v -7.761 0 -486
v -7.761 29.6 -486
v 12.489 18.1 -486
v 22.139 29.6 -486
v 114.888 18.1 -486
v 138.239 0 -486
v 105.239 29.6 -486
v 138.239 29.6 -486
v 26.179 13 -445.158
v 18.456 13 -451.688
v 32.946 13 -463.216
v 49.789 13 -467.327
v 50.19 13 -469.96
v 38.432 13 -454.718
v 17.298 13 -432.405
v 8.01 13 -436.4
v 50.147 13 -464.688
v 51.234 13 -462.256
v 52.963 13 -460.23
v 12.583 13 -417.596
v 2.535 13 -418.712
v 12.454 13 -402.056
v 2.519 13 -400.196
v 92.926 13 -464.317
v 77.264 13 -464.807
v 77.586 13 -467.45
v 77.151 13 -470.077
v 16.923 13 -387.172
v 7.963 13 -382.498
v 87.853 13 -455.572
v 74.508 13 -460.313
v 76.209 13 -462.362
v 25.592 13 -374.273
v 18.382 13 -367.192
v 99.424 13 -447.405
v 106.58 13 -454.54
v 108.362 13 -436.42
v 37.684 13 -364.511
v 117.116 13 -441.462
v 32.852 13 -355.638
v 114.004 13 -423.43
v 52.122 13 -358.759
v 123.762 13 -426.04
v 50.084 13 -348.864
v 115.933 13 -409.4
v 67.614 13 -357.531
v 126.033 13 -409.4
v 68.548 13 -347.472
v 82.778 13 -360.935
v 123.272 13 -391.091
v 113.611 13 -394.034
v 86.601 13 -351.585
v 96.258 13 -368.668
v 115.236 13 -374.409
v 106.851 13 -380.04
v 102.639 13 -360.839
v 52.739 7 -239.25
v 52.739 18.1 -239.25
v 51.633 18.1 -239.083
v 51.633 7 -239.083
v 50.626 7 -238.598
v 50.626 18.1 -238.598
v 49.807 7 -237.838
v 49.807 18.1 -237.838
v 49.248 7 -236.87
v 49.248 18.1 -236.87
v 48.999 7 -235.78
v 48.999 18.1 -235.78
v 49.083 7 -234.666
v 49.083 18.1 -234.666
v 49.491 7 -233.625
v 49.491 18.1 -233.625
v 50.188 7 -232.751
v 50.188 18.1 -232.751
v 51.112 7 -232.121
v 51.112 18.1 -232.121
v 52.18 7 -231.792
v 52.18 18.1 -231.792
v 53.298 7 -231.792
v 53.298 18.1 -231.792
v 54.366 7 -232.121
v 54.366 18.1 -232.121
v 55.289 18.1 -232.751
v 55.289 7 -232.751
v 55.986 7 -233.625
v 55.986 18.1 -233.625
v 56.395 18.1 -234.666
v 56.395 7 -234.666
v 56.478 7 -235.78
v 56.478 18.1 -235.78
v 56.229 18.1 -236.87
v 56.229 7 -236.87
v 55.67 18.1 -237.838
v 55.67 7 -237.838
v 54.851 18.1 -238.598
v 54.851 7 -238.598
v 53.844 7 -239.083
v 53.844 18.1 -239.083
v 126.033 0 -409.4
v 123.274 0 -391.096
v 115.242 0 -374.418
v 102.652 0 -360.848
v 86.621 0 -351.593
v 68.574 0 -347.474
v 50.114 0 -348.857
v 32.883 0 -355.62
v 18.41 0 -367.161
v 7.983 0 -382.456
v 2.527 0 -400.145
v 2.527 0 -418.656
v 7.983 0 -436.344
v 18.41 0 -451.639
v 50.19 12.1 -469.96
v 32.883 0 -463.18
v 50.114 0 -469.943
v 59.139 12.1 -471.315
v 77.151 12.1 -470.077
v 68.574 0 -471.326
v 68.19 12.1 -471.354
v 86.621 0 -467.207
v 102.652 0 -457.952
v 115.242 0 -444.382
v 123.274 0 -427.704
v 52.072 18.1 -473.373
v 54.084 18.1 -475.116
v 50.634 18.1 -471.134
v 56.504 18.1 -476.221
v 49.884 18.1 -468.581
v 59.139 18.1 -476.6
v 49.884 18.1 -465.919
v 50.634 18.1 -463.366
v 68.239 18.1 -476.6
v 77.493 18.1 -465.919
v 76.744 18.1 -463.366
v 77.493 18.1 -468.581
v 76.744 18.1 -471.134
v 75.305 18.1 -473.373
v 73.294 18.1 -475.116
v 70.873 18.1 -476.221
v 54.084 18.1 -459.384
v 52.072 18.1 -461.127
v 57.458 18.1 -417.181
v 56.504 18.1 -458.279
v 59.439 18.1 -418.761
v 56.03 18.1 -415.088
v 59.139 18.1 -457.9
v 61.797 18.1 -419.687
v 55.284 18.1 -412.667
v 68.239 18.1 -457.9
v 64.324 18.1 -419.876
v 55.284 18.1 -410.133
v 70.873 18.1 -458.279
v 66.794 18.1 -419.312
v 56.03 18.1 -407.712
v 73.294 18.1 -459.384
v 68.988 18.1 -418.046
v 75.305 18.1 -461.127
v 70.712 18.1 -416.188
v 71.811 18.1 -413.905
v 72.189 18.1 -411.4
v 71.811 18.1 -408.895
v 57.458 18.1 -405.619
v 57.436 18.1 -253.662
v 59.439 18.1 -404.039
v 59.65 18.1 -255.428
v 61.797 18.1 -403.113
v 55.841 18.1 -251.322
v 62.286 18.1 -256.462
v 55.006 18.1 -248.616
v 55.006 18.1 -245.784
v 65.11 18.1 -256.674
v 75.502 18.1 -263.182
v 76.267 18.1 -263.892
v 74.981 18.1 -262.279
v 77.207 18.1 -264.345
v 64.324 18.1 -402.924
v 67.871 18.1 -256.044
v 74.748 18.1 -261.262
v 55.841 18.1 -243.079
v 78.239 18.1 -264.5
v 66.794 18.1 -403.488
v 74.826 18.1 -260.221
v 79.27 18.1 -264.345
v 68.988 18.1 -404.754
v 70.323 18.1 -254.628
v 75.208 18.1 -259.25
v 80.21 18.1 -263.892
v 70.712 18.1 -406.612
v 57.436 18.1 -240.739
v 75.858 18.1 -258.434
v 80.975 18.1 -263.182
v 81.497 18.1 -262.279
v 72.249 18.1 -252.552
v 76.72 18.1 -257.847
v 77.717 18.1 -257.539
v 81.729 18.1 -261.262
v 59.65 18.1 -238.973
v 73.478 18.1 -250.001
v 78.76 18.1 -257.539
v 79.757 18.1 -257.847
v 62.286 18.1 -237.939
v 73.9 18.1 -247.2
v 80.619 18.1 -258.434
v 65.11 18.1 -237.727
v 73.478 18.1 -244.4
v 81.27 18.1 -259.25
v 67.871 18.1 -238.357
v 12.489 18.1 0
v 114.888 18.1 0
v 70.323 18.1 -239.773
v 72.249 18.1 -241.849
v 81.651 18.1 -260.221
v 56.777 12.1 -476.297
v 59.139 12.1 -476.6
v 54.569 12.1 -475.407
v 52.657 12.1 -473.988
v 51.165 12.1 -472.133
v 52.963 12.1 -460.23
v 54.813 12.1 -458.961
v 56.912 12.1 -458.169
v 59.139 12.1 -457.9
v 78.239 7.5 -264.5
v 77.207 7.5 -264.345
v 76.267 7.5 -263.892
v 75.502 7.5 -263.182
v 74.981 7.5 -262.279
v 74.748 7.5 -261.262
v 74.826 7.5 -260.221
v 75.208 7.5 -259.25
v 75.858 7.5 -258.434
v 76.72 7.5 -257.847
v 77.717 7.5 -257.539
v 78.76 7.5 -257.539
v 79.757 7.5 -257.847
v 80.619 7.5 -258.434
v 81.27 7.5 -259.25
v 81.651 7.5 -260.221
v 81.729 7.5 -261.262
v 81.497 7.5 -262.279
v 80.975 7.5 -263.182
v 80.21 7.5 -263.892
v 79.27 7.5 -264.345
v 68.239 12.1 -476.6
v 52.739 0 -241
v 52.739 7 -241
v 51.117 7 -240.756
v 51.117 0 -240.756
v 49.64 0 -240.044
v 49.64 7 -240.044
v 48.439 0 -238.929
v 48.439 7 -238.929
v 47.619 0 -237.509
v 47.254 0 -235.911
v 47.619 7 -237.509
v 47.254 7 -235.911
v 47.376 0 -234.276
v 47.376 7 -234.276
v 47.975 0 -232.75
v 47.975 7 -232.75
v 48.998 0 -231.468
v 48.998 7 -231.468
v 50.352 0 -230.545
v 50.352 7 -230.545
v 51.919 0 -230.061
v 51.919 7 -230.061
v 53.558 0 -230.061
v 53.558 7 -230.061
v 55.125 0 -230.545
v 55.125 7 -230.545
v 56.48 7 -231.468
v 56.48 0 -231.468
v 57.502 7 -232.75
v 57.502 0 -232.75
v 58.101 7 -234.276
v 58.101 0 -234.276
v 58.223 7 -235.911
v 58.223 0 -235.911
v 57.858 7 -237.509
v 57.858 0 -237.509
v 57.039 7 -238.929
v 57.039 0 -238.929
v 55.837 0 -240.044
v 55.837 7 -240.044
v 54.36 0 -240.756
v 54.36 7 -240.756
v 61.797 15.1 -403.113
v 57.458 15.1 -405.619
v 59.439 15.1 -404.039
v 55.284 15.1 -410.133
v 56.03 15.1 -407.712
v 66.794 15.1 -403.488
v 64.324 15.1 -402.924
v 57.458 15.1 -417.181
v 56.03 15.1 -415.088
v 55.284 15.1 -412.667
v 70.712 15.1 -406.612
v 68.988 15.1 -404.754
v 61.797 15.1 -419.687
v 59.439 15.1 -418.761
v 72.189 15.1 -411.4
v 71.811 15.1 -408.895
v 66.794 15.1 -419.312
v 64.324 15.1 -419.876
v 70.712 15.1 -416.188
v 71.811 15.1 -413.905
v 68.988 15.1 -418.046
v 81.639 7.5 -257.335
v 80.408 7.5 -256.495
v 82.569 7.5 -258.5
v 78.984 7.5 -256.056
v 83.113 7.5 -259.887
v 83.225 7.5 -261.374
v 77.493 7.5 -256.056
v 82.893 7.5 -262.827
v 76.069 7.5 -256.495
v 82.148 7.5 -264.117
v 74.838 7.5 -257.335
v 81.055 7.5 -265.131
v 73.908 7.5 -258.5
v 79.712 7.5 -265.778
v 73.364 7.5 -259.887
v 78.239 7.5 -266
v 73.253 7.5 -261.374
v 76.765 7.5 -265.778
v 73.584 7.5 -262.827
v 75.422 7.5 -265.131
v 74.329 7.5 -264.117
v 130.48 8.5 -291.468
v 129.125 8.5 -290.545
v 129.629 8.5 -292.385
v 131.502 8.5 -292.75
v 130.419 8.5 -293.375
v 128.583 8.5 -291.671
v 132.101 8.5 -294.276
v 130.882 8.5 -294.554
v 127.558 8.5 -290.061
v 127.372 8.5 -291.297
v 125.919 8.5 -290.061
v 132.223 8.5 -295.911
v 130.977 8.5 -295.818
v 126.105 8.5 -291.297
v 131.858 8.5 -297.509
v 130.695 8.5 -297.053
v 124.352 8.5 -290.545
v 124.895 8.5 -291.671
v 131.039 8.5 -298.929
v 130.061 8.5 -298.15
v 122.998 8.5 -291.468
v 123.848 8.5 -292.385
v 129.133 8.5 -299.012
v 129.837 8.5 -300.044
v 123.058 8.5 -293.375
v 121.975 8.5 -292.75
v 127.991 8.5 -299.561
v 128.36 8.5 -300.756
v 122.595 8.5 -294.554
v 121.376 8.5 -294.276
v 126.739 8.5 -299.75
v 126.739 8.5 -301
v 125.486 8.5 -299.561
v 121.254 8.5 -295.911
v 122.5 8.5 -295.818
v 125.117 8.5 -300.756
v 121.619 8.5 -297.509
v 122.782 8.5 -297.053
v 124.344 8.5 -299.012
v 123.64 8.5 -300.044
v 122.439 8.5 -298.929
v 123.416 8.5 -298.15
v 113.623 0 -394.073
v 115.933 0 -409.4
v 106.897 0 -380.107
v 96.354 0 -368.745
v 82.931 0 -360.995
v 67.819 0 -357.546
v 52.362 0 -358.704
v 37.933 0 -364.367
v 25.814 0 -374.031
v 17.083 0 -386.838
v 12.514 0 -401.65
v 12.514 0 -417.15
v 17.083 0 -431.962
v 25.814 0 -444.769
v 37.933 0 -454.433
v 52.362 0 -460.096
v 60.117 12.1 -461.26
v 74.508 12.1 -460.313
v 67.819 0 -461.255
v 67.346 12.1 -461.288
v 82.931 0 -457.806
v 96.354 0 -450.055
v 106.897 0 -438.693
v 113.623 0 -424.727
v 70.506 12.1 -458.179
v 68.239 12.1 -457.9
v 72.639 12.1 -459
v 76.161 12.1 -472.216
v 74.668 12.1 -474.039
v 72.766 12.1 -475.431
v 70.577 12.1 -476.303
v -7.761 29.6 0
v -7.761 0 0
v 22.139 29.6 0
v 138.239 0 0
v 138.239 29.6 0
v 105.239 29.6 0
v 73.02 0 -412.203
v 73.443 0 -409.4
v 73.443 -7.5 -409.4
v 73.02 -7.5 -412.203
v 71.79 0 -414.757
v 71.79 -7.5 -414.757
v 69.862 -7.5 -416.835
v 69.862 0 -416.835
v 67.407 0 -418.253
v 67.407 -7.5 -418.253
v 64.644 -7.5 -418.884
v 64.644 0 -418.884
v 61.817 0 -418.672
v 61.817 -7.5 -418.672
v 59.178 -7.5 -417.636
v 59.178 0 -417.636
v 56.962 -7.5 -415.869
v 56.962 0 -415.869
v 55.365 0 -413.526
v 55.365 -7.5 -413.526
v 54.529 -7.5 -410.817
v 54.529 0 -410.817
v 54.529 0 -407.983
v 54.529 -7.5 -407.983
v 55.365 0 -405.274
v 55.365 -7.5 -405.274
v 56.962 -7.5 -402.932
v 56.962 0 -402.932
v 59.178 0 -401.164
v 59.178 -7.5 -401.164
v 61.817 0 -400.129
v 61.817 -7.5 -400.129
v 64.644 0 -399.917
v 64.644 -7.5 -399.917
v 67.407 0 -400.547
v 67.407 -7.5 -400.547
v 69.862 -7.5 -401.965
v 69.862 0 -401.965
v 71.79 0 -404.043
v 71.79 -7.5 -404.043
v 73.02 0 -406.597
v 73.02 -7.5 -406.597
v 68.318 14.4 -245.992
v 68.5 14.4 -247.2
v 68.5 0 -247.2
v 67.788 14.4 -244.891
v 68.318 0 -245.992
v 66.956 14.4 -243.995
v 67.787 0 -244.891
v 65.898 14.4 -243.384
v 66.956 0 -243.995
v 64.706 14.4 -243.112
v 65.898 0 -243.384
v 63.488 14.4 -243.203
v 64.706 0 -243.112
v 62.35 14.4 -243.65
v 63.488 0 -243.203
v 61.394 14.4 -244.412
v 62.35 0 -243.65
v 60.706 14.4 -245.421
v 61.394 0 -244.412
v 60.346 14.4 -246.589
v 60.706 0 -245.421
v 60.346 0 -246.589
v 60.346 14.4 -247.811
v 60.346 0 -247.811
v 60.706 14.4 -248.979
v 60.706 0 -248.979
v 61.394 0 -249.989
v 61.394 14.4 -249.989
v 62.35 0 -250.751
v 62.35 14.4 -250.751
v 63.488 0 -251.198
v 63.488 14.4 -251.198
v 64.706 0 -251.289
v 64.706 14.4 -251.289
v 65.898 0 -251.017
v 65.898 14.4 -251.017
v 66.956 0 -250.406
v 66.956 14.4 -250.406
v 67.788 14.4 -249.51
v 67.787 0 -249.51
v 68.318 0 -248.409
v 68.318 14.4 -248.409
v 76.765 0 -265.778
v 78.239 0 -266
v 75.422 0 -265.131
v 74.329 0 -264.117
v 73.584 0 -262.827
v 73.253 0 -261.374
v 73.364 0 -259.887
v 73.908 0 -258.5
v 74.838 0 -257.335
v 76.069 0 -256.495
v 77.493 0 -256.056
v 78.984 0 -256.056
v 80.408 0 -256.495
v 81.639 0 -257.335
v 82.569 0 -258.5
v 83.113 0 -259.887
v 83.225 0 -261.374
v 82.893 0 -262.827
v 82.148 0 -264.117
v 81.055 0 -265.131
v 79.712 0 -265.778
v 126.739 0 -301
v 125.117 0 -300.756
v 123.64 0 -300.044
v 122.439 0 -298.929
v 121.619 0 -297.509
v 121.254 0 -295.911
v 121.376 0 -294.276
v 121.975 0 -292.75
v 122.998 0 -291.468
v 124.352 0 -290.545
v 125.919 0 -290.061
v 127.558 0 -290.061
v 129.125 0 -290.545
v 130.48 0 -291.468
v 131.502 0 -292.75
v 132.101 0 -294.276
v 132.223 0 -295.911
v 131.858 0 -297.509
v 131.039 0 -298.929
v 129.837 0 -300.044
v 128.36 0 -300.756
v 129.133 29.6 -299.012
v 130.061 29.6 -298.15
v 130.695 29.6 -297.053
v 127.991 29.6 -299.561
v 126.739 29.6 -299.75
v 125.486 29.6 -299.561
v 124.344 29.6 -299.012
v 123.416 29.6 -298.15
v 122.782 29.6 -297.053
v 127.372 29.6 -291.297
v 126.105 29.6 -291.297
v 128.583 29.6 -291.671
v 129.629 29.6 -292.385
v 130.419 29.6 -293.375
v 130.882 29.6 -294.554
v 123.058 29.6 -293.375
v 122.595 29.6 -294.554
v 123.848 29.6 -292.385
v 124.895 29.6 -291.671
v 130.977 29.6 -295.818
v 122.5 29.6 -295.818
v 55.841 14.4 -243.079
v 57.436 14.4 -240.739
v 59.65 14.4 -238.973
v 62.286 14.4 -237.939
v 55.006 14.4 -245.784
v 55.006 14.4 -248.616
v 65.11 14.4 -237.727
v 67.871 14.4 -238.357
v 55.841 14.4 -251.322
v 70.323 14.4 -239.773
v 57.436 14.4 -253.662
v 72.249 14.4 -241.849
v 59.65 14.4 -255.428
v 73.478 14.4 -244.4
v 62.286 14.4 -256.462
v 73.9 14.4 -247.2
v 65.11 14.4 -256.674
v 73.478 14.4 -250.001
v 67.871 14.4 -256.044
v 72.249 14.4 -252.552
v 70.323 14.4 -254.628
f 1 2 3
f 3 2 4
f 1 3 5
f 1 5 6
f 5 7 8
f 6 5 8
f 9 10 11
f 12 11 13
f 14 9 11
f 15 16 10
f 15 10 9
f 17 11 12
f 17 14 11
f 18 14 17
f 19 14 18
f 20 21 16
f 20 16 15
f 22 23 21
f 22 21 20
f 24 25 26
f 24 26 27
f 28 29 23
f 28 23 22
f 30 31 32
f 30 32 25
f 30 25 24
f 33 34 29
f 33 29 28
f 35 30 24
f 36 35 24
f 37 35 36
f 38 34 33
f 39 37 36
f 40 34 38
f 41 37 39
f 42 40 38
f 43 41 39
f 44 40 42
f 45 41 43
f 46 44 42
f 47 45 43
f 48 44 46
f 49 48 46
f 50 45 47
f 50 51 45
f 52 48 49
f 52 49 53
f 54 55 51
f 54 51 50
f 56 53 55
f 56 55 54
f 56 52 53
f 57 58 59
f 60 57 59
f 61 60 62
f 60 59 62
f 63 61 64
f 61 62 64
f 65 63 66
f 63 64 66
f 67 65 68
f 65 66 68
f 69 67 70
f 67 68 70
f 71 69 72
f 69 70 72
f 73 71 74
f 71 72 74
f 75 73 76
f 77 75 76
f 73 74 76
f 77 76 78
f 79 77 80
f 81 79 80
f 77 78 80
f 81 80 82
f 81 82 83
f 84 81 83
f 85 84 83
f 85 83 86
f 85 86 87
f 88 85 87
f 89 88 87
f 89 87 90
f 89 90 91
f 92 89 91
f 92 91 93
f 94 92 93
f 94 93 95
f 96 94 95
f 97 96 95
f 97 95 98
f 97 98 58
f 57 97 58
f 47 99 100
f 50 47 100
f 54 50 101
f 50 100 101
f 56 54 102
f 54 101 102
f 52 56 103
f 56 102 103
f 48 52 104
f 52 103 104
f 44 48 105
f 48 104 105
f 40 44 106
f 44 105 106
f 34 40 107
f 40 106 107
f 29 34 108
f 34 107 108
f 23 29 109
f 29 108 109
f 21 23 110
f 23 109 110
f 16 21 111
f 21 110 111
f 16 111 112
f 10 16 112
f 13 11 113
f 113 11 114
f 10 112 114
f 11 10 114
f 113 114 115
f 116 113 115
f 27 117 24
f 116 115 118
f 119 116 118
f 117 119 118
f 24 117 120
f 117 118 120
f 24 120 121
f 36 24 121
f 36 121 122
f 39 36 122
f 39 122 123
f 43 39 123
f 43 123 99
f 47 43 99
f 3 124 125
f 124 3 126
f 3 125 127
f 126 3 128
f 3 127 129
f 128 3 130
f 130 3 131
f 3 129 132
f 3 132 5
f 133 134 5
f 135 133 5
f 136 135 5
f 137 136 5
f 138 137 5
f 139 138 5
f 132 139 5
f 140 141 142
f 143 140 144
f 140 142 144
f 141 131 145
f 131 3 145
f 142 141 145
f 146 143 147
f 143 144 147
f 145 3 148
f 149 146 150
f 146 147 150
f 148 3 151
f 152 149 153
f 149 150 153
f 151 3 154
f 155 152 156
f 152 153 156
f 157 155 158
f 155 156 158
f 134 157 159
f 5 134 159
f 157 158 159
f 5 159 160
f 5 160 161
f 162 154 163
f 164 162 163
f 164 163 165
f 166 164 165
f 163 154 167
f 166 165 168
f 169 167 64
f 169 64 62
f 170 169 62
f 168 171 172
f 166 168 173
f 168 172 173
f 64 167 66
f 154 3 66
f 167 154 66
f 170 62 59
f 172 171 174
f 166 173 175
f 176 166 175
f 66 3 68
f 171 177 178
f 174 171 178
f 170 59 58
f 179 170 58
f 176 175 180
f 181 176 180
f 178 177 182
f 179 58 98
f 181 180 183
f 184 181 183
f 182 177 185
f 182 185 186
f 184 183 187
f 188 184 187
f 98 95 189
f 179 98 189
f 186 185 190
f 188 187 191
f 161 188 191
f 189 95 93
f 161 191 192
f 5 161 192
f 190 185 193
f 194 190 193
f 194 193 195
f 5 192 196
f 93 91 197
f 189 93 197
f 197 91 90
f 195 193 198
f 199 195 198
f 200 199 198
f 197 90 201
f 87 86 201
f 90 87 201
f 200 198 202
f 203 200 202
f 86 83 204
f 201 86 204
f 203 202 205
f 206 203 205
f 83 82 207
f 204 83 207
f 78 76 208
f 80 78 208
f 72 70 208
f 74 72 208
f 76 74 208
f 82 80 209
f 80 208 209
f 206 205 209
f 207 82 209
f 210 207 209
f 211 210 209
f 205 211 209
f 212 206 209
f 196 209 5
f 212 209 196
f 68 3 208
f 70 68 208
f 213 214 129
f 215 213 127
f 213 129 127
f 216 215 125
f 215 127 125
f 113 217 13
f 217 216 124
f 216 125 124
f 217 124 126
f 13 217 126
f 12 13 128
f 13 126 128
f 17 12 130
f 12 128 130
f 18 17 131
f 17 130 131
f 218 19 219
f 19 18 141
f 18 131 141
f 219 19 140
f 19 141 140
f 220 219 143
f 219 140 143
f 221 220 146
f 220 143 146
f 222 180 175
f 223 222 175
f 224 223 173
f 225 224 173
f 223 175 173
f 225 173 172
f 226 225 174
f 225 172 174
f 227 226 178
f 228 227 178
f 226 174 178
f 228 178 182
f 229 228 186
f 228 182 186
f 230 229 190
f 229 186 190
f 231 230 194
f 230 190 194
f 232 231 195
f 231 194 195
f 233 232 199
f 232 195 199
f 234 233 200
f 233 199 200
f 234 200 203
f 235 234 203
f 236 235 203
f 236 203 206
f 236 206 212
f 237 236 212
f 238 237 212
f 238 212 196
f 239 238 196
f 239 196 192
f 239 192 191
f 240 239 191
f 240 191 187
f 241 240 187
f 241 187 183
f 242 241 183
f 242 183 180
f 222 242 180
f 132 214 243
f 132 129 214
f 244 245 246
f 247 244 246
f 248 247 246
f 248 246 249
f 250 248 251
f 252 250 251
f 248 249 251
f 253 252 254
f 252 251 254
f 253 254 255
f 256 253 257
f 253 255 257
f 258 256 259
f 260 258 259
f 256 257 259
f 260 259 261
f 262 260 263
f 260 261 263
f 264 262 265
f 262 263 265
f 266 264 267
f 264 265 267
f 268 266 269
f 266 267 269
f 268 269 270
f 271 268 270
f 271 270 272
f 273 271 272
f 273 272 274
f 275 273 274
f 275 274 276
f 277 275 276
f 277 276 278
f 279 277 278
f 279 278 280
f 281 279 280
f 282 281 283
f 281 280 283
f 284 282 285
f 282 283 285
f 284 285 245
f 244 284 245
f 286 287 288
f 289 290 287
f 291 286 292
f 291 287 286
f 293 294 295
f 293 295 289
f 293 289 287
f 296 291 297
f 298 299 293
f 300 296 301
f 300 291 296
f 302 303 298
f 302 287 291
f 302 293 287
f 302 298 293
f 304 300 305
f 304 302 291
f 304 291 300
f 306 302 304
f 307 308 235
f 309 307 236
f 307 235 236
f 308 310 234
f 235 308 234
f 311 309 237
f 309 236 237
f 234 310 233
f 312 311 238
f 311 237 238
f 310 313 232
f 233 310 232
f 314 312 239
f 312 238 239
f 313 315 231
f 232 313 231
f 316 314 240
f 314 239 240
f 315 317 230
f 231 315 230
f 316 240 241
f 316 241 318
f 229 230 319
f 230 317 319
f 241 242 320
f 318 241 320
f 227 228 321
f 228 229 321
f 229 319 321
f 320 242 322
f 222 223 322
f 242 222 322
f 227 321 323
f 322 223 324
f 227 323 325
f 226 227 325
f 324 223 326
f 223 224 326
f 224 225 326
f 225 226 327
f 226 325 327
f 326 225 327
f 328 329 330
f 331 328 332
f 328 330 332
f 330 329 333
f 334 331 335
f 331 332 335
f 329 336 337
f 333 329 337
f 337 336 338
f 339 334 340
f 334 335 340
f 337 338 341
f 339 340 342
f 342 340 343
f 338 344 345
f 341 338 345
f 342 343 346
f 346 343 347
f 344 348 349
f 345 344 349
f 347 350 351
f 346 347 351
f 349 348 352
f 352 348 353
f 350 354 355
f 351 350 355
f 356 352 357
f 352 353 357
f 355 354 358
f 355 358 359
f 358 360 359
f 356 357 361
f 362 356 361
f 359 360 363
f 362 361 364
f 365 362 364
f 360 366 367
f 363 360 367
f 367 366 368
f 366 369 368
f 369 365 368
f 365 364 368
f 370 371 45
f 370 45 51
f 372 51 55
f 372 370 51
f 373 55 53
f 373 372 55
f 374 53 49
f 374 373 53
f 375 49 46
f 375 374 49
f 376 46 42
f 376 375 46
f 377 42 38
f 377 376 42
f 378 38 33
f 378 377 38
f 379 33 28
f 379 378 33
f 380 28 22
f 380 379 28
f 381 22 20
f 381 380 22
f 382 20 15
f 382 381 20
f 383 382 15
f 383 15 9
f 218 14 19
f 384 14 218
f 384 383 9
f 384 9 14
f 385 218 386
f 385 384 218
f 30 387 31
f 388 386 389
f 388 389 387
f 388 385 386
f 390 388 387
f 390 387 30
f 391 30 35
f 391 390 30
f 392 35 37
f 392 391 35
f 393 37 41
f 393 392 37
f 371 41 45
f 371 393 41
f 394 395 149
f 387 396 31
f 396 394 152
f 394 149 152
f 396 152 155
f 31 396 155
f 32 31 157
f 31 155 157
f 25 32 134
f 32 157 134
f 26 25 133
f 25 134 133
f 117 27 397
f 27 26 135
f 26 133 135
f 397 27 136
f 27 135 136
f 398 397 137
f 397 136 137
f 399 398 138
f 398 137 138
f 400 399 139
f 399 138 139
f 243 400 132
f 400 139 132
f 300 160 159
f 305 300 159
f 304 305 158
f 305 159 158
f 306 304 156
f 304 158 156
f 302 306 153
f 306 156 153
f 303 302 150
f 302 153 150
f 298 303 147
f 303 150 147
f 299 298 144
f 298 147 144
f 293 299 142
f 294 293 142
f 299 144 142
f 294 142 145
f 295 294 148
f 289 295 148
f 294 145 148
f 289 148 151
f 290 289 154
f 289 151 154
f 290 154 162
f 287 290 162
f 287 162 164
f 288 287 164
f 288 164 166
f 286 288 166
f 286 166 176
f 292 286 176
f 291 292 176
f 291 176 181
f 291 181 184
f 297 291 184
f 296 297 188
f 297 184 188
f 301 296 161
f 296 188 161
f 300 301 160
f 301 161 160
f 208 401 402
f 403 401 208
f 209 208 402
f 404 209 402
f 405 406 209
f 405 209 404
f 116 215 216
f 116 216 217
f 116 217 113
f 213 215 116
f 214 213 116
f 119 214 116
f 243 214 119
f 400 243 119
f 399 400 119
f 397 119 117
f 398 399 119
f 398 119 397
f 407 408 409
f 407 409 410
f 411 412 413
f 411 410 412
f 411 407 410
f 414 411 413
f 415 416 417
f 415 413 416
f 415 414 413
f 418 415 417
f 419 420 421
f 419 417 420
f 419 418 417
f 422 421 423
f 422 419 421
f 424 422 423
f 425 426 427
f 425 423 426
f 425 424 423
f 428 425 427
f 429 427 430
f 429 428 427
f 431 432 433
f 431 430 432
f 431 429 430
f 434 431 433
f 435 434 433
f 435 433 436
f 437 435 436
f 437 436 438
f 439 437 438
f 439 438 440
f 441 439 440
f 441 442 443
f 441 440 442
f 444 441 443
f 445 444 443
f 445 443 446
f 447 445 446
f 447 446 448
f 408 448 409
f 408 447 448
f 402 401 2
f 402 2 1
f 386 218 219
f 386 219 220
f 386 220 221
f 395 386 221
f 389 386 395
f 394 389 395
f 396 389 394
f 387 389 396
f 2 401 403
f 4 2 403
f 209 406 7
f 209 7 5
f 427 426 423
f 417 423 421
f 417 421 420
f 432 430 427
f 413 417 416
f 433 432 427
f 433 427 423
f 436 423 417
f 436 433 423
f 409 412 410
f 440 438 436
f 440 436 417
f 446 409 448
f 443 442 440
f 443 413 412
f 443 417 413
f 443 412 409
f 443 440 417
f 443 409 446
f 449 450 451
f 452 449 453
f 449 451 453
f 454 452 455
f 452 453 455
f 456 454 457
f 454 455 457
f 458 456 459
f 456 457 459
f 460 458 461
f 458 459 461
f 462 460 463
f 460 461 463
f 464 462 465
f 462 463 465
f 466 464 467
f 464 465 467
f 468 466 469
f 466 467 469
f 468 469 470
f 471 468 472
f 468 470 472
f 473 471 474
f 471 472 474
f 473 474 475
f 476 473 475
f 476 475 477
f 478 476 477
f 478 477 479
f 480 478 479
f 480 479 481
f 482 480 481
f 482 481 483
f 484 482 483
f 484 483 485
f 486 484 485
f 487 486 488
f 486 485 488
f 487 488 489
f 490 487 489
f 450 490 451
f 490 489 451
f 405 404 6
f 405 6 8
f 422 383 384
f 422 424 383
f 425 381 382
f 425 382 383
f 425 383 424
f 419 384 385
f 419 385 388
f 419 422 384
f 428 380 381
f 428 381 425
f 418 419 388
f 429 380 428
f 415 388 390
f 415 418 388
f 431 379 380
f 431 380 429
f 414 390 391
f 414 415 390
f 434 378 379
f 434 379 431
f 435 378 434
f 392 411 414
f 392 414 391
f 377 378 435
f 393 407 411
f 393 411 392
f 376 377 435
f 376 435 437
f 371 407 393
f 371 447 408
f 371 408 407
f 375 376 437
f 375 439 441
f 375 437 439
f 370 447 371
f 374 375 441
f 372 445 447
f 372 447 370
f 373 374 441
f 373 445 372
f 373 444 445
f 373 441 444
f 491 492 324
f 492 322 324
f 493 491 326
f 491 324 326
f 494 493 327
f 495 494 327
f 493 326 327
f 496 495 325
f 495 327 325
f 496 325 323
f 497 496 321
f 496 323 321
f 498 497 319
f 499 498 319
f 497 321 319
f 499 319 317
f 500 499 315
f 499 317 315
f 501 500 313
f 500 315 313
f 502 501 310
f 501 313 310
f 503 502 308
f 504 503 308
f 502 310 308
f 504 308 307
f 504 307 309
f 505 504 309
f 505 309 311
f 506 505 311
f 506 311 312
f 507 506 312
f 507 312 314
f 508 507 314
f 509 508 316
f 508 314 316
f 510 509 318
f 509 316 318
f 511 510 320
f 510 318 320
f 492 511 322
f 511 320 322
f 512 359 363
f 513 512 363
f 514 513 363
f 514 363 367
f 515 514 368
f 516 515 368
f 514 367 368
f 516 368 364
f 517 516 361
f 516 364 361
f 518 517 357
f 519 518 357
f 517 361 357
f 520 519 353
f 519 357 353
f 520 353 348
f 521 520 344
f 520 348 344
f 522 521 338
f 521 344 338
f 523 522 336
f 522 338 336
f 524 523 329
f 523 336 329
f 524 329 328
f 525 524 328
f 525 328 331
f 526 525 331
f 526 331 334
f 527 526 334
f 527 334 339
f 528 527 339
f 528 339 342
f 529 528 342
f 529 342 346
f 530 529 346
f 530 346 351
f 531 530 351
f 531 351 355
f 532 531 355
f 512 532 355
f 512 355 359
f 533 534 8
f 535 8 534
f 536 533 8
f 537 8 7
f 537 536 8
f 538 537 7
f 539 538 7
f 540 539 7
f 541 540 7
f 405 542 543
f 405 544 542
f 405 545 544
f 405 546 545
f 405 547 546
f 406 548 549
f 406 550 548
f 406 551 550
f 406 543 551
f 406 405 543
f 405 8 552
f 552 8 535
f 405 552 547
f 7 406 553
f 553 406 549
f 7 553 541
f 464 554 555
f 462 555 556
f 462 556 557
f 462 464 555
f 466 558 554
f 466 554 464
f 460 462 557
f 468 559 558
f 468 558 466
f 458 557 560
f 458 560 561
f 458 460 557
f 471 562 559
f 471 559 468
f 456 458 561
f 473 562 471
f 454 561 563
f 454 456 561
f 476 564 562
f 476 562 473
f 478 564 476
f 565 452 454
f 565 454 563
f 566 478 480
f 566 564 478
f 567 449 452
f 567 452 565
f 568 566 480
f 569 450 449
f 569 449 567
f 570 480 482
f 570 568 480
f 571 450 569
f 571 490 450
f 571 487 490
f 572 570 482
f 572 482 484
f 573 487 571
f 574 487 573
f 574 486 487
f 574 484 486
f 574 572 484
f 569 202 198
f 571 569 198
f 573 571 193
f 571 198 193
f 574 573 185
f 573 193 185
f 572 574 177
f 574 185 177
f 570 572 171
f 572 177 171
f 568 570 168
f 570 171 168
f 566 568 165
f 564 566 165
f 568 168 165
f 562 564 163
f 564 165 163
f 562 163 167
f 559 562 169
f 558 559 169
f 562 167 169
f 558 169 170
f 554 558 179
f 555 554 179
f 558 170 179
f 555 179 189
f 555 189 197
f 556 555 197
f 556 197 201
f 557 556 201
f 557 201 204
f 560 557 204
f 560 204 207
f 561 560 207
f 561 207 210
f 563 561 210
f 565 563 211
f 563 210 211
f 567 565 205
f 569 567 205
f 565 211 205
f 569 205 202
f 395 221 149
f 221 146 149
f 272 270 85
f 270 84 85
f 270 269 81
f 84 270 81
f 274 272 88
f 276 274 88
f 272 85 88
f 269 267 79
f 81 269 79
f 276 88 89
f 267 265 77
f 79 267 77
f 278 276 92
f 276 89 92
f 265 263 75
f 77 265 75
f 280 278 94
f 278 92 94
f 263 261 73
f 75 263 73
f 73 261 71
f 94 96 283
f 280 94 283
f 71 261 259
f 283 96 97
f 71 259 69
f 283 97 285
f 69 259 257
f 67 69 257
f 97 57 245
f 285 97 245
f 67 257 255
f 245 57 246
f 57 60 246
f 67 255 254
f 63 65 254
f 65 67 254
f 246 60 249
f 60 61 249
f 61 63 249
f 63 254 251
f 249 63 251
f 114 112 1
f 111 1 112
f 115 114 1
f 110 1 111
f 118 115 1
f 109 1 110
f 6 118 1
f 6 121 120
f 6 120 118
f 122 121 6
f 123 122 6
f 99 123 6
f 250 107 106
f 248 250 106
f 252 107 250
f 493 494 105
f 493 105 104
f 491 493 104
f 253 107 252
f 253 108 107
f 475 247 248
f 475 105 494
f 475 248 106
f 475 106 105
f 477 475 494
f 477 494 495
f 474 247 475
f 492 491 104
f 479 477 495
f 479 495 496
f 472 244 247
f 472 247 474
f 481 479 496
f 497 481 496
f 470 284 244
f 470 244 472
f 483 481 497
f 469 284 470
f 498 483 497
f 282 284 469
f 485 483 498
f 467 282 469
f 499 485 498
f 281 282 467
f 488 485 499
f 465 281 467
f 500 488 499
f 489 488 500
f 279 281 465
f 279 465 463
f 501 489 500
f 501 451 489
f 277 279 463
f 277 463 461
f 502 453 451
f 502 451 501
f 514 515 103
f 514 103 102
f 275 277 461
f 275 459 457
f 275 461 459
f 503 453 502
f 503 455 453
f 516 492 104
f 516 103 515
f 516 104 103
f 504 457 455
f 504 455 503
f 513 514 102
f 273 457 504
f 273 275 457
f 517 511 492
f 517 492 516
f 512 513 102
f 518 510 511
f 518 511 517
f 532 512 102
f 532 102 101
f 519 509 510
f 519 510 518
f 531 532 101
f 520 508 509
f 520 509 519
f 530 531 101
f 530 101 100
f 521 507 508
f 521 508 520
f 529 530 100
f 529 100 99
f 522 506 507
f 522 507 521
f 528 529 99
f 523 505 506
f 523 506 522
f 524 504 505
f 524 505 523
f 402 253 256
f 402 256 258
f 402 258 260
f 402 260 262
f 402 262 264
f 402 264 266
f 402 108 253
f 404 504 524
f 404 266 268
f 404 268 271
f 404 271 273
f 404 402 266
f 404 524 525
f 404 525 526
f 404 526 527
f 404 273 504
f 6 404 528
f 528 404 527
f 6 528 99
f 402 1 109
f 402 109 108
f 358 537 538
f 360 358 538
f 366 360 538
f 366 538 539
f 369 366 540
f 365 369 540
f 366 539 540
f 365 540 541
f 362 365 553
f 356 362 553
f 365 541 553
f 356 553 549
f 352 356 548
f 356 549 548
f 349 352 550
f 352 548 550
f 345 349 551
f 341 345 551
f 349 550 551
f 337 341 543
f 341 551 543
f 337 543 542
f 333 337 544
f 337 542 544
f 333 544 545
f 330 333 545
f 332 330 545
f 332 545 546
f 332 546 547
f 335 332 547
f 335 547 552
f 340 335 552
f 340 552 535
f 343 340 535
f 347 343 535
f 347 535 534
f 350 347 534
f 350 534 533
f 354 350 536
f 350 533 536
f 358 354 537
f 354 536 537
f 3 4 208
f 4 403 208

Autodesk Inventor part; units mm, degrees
ref_plane "YZ Plane" through (0, 0, 0) normal (1, 0, 0) x (0, 1, 0)
ref_plane "XZ Plane" through (0, 0, 0) normal (0, 1, 0) x (-1, 0, 0)
ref_plane "XY Plane" through (0, 0, 0) normal (0, 0, 1) x (1, 0, 0)
sketch "Sketch1" plane through (0, 0, 0) normal (0, 0, 1) x (1, 0, 0)
  line L0 (-7.7614, 0) -> (138.2386, 0)
  line L1 (138.2386, 0) -> (138.2386, 29.6)
  line L2 (-7.7614, 29.6) -> (-7.7614, 0)
  line L3 (-7.7614, 29.6) -> (22.1386, 29.6)
  line L4 (12.489, 18.1) -> (114.8883, 18.1)
  line L5 (22.1386, 29.6) -> (12.489, 18.1)
  line L6 (22.1386, 29.6) -> (41.4586, 29.6) construction
  line L7 (138.2386, 29.6) -> (105.2386, 29.6)
  line L8 (105.2386, 29.6) -> (114.8883, 18.1)
  point P0 (0, 0)
  dimension "d0" = 146
  dimension "d1" = 29.6
  dimension "d2" = 29.9
  dimension "d4" = 130
  dimension "d5" = 33
  dimension "d6" = 50
extrude "Extrusion1" add sketch "Sketch1" against normal blind 486
sketch "Sketch2" plane through (-7.7614, 29.6, 0) normal (0, 1, 0) x (1, 0, 0)
  line L0 (113, 0) -> (122.6496, 0) projected
  line L1 (124, 486) -> (113, 0)
  line L2 (113, 0) -> (113, 486) projected
  line L3 (113, 486) -> (124, 486)
  line L4 (122.6496, 0) -> (122.6496, 486) projected
  line L5 (113, 486) -> (113, 0)
  line L6 (146, 0) -> (146, 486) projected
  point P0 (7.7614, 0)
  dimension "d9" = 22
sketch "Sketch3" plane through (-7.7614, 0, 0) normal (0, -1, 0) x (1, 0, 0)
  line L0 (20.2504, -486) -> (122.6496, -486) projected
  line L1 (0, 0) -> (146, 0) projected
  circle A0 centre (71.6943, -409.4001) radius 62.1
  line L2 (71.45, -486) -> (71.4962, -471.5001)
  circle A1 centre (71.6943, -409.4001) radius 52
  circle A2 centre (71.6943, -409.4001) radius 9.51
  circle A3 centre (72.1613, -247.2004) radius 4.1
  point P0 (7.7614, 0)
  dimension "d10" = 124.2
  dimension "d11" = 14.5
  dimension "d12" = 62.1
  dimension "d13" = 104
  dimension "d14" = 19.02
  dimension "d15" = 8.2
extrude "Extrusion2" cut sketch "Sketch3" against normal blind 13 contours A0
extrude "Extrusion3" add sketch "Sketch3" along normal blind 7.5 contours A2
extrude "Extrusion4" cut sketch "Sketch3" against normal through all contours A3
sketch "Sketch4" plane through (12.489, 18.1, 0) normal (0, 1, 0) x (1, 0, 0)
  circle A0 centre (51.911, 247.2004) radius 4.1 projected
  circle A1 centre (51.911, 247.2004) radius 9.5
  line L0 (0, 486) -> (102.3993, 486) projected
  line L1 (51.1996, 486) -> (51.1996, 476.6)
  arc A2 (46.6496, 476.6) -> (46.6496, 457.9) centre (46.6496, 467.25) ccw
  arc A3 (55.7496, 457.9) -> (55.7496, 476.6) centre (55.7496, 467.25) ccw
  line L2 (46.6496, 476.6) -> (55.7496, 476.6)
  line L3 (46.6496, 457.9) -> (55.7496, 457.9)
  circle A4 centre (51.1996, 411.4) radius 8.5
  point P0 (-12.489, 0)
  point P1 (51.1996, 476.6)
  dimension "d23" = 19
  dimension "d26" = 9.4
  dimension "d29" = 0
  dimension "d30" = 18.7
  dimension "d31" = 18.7
  dimension "d38" = 17
  dimension "d39" = 46.5
extrude "Extrusion5" cut sketch "Sketch4" against normal blind 3.7 contours A1
extrude "Extrusion7" cut sketch "Sketch4" against normal blind 6 contours L2 A3 L3 A2
extrude "Extrusion8" cut sketch "Sketch4" against normal blind 3 contours A4
sketch "Sketch5" plane through (-7.7614, 0, 0) normal (0, -1, 0) x (1, 0, 0)
  point P0 (7.7614, 0)
sketch "Sketch6" plane through (-7.7614, 0, 0) normal (0, -1, 0) x (1, 0, 0)
  circle A0 centre (86, -261) radius 5
  line L0 (146, -486) -> (0, -486) projected
  line L1 (146, 0) -> (146, -486) projected
  circle A1 centre (60.5, -235.5) radius 5.5
  line L2 (0, 0) -> (0, -486) projected
  circle A2 centre (134.5, -295.5) radius 5.5
  point P0 (7.7614, 0)
  dimension "d42" = 10
  dimension "d43" = 225
  dimension "d44" = 60
  dimension "d45" = 11
  dimension "d46" = 60.5
  dimension "d47" = 250.5
  dimension "d48" = 11
  dimension "d49" = 190.5
  dimension "d50" = 11.5
hole "Hole1" at (126.7386, 0, -295.5) direction (0, 1, 0) diameter 8.5 end through all counterbore diameter 11 counterbore depth 8.5
hole "Hole2" at (78.2386, 0, -261) direction (0, 1, 0) diameter 7 end through all counterbore diameter 10 counterbore depth 7.5
hole "Hole3" at (52.7386, 0, -235.5) direction (0, 1, 0) diameter 7.5 end through all counterbore diameter 11 counterbore depth 7
thread "Thread1" size "M9x1.25" class "6H" standard "ANSI Metric M Profile" full length
properties part number "slide ontop of saddle"
